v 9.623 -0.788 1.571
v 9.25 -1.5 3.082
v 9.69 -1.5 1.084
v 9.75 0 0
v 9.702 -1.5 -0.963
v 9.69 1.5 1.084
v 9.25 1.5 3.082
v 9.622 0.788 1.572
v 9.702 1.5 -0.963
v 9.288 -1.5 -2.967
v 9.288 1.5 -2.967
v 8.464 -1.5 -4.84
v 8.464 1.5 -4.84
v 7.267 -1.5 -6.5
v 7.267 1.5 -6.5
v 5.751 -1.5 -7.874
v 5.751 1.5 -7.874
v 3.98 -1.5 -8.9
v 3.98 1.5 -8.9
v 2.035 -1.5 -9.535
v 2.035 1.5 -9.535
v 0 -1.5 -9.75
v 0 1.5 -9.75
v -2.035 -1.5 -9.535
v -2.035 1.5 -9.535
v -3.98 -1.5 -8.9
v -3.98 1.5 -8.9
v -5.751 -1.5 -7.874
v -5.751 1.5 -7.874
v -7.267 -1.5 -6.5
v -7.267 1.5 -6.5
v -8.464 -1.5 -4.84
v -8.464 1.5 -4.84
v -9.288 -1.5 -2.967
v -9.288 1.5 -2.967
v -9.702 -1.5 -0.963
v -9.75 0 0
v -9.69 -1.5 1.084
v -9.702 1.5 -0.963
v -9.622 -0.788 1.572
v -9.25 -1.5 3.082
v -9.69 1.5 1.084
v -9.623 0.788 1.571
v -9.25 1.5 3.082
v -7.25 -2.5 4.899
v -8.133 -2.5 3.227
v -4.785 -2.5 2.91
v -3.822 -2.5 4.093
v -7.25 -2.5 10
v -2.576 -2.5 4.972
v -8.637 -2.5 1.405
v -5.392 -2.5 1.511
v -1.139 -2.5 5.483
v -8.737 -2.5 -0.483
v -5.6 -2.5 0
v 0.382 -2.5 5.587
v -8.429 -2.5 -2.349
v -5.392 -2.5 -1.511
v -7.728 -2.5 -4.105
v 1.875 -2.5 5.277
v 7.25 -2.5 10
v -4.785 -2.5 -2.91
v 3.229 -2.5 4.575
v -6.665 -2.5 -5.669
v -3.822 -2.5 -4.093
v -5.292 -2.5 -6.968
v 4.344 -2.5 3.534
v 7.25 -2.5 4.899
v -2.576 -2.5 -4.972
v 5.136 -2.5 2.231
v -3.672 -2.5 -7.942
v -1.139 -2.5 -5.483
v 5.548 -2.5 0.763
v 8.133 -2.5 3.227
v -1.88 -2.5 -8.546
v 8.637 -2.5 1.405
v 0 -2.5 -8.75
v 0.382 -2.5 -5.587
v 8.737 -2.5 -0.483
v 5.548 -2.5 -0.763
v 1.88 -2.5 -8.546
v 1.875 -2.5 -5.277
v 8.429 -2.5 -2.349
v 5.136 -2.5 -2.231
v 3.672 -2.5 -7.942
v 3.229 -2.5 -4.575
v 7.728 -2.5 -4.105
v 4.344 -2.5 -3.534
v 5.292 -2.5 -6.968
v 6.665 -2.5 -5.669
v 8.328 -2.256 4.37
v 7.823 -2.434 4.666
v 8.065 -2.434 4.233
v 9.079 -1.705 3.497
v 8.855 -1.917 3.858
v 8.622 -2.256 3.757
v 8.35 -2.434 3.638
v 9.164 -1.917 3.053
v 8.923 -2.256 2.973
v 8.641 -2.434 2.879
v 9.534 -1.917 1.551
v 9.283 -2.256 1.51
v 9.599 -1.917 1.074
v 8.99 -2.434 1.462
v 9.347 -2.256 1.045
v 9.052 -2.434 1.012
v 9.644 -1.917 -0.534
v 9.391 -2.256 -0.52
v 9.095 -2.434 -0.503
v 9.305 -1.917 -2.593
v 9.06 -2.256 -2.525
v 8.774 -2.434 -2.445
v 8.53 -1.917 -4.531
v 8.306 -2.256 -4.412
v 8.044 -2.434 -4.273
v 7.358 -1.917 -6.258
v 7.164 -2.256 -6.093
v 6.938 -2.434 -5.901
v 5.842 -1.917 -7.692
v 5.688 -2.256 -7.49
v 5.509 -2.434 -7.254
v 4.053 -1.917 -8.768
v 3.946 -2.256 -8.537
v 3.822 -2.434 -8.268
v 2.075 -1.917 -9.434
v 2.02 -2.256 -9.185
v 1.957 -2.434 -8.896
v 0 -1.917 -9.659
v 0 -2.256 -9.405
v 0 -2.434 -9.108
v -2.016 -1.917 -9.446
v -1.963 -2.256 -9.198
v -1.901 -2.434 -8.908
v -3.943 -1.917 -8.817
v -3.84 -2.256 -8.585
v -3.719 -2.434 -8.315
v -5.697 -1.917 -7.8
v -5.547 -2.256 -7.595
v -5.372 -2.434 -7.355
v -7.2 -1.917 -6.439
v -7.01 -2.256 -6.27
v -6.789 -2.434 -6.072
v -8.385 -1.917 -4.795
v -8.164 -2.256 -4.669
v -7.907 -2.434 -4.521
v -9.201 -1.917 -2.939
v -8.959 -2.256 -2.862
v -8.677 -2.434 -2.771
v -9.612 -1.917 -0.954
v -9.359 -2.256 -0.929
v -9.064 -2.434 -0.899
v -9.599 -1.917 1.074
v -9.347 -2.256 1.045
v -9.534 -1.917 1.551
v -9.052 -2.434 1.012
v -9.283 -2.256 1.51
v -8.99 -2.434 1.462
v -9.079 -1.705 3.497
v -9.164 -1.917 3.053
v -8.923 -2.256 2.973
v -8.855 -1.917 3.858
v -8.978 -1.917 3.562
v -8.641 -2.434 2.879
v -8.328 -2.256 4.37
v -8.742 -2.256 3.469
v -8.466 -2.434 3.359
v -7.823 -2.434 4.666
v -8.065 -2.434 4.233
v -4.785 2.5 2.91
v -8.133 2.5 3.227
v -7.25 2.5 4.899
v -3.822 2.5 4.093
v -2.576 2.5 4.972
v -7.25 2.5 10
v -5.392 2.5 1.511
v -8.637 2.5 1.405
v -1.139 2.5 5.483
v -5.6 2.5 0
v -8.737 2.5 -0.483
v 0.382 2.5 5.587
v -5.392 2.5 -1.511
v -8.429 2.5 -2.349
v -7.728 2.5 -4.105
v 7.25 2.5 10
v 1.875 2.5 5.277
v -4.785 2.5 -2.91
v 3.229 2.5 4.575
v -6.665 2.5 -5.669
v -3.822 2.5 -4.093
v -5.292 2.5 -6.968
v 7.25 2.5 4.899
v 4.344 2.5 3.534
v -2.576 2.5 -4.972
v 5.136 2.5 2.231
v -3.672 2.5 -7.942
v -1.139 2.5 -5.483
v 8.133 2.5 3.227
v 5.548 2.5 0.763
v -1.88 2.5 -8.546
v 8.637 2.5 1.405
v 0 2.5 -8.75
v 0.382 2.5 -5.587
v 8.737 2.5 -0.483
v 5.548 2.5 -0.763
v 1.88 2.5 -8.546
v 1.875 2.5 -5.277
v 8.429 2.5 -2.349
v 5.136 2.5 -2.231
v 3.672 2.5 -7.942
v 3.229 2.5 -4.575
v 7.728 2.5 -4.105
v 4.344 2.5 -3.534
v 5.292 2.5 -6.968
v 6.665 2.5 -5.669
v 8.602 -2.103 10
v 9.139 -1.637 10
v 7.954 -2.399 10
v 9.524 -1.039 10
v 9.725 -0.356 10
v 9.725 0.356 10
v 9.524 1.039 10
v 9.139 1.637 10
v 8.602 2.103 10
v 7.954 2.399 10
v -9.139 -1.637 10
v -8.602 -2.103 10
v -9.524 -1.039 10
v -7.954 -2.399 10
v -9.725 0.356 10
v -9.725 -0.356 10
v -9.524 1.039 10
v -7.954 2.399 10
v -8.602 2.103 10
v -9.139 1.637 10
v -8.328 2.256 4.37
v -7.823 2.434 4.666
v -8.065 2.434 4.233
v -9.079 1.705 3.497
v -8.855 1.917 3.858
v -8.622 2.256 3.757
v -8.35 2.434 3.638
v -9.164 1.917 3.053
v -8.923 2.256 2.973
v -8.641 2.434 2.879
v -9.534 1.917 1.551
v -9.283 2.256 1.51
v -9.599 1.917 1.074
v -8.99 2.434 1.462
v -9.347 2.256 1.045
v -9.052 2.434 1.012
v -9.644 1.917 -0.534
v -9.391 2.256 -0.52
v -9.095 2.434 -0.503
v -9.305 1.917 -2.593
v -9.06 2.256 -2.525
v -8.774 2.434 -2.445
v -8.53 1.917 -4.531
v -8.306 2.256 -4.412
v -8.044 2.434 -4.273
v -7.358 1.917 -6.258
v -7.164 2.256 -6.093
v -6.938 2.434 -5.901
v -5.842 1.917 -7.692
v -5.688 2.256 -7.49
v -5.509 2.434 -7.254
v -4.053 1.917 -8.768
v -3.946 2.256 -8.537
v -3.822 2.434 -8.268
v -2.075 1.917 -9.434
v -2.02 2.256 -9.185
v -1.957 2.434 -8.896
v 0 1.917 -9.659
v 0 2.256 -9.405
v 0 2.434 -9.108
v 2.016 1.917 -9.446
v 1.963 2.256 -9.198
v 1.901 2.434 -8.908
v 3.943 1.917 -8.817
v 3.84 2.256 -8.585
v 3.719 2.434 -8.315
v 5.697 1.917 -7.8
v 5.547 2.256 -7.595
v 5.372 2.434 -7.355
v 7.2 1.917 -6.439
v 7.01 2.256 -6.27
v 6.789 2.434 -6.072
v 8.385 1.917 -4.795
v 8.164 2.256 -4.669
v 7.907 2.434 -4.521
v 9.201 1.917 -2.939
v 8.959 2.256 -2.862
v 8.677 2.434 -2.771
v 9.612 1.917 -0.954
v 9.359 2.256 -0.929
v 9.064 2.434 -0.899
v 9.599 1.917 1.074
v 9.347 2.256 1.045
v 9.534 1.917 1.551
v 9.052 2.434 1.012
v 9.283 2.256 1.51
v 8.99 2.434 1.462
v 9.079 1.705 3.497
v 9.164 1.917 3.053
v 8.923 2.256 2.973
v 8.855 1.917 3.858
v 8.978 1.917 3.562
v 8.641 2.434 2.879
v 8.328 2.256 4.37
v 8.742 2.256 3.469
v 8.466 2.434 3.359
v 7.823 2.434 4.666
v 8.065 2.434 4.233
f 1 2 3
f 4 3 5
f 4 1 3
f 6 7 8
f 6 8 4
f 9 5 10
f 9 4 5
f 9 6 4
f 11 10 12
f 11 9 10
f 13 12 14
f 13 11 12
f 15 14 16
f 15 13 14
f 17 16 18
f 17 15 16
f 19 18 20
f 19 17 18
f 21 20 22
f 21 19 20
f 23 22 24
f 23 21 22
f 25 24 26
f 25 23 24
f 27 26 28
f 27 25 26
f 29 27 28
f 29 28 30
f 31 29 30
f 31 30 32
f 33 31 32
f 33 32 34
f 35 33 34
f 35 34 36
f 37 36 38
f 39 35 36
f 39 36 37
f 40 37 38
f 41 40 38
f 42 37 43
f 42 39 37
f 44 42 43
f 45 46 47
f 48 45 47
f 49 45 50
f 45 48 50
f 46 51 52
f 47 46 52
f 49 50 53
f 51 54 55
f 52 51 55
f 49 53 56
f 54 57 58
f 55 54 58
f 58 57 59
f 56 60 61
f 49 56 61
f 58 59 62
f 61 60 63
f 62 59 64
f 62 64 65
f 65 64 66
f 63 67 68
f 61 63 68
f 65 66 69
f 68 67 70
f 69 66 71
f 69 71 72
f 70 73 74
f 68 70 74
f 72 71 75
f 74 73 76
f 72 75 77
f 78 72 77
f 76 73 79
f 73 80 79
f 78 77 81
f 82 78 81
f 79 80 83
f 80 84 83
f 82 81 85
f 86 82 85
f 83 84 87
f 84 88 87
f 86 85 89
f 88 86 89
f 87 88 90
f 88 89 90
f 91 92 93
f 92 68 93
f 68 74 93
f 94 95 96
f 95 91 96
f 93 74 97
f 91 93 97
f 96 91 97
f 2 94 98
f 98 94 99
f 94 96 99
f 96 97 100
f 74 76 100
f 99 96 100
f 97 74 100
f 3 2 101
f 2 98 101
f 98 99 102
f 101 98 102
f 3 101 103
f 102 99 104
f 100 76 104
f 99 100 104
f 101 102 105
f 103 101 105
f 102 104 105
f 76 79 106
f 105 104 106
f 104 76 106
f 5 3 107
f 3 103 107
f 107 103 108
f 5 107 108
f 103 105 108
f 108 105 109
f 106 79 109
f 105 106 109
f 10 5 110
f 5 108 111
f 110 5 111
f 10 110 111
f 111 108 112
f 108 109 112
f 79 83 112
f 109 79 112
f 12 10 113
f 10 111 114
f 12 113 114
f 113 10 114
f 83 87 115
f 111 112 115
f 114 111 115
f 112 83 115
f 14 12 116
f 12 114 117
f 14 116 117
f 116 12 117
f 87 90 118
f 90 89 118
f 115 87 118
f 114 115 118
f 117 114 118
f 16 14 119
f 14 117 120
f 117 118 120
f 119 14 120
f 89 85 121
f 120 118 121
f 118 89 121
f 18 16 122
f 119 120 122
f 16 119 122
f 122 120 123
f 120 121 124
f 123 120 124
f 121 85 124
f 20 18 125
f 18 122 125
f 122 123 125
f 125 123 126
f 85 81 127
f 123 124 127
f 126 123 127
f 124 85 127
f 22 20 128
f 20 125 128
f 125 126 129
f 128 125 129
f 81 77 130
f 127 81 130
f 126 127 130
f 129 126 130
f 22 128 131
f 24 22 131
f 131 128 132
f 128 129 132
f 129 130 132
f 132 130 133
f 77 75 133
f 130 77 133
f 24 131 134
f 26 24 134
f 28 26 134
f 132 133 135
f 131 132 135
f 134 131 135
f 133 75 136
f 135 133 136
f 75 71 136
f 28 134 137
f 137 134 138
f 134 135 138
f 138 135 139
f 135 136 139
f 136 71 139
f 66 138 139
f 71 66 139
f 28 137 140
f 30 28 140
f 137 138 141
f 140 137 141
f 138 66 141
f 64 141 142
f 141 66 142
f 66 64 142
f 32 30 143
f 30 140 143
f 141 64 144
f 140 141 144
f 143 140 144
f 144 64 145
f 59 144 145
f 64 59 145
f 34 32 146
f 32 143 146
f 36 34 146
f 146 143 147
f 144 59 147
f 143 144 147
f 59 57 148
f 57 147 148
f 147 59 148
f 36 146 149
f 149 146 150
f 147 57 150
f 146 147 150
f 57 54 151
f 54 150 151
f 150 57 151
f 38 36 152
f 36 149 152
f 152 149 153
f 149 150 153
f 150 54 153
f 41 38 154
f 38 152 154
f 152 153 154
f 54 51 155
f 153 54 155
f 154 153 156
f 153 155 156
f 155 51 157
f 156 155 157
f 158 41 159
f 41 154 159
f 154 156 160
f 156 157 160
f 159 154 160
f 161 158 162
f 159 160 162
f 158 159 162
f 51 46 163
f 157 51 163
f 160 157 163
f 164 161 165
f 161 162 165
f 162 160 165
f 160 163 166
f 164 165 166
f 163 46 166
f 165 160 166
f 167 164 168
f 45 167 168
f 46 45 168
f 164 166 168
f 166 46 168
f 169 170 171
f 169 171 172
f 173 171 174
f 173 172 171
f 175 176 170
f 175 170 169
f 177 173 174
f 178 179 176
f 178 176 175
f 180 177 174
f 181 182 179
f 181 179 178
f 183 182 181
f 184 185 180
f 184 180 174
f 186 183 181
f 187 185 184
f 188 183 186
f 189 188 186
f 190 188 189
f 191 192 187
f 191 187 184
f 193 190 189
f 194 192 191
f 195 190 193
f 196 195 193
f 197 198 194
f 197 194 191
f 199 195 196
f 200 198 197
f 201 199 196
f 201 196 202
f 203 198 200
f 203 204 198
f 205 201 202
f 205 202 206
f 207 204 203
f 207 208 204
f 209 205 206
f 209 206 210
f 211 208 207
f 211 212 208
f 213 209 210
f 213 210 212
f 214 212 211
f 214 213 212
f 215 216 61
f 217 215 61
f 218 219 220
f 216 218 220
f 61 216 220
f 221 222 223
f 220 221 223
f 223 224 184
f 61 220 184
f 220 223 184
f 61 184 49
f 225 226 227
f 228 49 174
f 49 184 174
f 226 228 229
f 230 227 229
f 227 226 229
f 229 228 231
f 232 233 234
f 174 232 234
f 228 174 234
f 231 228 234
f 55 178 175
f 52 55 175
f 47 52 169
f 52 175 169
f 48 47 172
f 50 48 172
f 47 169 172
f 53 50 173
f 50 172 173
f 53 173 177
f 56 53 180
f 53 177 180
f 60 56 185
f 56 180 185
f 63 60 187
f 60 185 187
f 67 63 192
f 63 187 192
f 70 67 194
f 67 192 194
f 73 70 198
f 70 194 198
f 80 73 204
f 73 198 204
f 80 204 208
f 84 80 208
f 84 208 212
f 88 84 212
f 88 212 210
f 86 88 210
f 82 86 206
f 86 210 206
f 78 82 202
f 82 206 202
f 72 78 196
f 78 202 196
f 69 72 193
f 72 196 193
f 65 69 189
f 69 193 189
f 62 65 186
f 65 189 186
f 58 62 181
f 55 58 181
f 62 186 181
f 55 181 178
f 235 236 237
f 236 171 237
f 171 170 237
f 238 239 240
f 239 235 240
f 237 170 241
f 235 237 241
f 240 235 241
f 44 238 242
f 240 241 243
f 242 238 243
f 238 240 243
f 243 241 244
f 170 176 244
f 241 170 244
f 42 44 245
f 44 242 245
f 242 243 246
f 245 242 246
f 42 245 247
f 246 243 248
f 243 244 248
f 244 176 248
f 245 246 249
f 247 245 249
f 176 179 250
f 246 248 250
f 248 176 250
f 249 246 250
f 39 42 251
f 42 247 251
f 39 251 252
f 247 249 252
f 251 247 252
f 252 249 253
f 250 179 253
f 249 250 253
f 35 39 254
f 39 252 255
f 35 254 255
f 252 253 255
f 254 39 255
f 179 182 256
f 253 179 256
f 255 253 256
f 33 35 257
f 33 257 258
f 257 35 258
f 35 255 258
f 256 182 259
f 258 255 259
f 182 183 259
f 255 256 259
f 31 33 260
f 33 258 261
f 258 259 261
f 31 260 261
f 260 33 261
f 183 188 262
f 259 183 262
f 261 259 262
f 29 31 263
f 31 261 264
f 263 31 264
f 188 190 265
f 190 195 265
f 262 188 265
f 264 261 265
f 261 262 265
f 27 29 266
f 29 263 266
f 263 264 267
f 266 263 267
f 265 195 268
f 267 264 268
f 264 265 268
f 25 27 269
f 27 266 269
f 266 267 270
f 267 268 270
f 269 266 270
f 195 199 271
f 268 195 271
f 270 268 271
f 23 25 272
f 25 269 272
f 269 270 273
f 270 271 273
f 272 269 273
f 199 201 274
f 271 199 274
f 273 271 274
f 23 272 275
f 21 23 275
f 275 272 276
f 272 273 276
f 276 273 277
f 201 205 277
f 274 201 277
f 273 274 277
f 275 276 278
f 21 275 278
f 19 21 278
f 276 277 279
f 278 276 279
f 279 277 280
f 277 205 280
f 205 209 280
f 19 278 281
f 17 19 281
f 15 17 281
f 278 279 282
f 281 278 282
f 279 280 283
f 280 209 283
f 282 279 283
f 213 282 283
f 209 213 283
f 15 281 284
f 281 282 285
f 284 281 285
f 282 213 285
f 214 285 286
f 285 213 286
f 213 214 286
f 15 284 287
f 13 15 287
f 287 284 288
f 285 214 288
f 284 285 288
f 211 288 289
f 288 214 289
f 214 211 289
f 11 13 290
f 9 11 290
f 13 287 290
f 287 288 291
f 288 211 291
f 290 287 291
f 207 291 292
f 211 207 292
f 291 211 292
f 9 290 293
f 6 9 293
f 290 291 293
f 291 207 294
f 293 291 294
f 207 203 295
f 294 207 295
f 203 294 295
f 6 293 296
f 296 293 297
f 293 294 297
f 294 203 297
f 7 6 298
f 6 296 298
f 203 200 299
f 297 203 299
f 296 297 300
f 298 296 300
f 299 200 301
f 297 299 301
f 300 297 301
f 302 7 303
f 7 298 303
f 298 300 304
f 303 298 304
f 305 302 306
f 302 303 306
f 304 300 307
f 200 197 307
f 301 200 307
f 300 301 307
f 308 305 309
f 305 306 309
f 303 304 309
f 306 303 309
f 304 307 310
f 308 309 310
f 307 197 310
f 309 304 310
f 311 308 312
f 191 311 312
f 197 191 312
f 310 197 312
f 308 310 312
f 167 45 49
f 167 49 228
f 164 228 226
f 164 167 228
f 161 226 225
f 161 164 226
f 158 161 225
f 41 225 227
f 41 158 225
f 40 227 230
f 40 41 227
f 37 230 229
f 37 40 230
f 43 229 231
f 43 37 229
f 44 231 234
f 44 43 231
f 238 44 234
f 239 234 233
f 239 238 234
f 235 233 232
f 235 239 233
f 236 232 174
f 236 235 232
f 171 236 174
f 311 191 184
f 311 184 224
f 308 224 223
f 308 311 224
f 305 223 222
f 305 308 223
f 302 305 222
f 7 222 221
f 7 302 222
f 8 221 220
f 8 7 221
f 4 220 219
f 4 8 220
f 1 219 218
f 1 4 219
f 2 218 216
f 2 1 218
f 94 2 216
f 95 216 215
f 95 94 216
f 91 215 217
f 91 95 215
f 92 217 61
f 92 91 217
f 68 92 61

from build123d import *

# Parameters (mm, degrees)
EXTRUDE_1_DEPTH     = 10
SKETCH_2_R          = 9.75
EXTRUDE_2_DEPTH     = 5
FILLET_2_R          = 1
SKETCH_3_R          = 5.6
CUT_EXTRUDE_1_DEPTH = 5


with BuildPart() as part:
    # 草图1 → 凸台-拉伸1 (new body)
    with BuildSketch(Plane.XY):
        with BuildLine():
            Line((-7.25, 2.4999999999999996), (7.249999999999998, 2.500000000000002))
            ThreePointArc((7.249999999999998, 2.500000000000002), (9.75, 4.33e-15), (7.250000000000002, -2.499999999999997))
            Line((7.250000000000002, -2.499999999999997), (-7.25, -2.4999999999999996))
            ThreePointArc((-7.25, -2.4999999999999996), (-9.75, 3.1e-16), (-7.25, 2.4999999999999996))
        make_face()
    extrude(amount=EXTRUDE_1_DEPTH)

    # 草图2 → 凸台-拉伸2 (add)
    with BuildSketch(Plane(origin=(-4.5e-16, 2.500000000000001, 0), x_dir=(1, 1.7e-16, 0), z_dir=(-1.7e-16, 1, 0))):
        Circle(SKETCH_2_R)
    extrude(amount=-EXTRUDE_2_DEPTH)

    # 圆角2
    fillet_2_edges = [part.edges().sort_by_distance(p)[0] for p in [
        (8.387e-14, -2.499999999999999, -9.75),
        (8.304e-14, 2.500000000000001, -9.75),
    ]]
    fillet(fillet_2_edges, radius=FILLET_2_R)

    # 草图3 → 切除-拉伸1 (cut)
    with BuildSketch(Plane(origin=(-4.5e-16, 2.500000000000001, 0), x_dir=(1, 1.7e-16, 0), z_dir=(-1.7e-16, 1, 0))):
        with Locations(Location((0, 0, 0), (0, 0, 180))):
            Circle(SKETCH_3_R)
    extrude(amount=-CUT_EXTRUDE_1_DEPTH, mode=Mode.SUBTRACT)


solid = part.part
